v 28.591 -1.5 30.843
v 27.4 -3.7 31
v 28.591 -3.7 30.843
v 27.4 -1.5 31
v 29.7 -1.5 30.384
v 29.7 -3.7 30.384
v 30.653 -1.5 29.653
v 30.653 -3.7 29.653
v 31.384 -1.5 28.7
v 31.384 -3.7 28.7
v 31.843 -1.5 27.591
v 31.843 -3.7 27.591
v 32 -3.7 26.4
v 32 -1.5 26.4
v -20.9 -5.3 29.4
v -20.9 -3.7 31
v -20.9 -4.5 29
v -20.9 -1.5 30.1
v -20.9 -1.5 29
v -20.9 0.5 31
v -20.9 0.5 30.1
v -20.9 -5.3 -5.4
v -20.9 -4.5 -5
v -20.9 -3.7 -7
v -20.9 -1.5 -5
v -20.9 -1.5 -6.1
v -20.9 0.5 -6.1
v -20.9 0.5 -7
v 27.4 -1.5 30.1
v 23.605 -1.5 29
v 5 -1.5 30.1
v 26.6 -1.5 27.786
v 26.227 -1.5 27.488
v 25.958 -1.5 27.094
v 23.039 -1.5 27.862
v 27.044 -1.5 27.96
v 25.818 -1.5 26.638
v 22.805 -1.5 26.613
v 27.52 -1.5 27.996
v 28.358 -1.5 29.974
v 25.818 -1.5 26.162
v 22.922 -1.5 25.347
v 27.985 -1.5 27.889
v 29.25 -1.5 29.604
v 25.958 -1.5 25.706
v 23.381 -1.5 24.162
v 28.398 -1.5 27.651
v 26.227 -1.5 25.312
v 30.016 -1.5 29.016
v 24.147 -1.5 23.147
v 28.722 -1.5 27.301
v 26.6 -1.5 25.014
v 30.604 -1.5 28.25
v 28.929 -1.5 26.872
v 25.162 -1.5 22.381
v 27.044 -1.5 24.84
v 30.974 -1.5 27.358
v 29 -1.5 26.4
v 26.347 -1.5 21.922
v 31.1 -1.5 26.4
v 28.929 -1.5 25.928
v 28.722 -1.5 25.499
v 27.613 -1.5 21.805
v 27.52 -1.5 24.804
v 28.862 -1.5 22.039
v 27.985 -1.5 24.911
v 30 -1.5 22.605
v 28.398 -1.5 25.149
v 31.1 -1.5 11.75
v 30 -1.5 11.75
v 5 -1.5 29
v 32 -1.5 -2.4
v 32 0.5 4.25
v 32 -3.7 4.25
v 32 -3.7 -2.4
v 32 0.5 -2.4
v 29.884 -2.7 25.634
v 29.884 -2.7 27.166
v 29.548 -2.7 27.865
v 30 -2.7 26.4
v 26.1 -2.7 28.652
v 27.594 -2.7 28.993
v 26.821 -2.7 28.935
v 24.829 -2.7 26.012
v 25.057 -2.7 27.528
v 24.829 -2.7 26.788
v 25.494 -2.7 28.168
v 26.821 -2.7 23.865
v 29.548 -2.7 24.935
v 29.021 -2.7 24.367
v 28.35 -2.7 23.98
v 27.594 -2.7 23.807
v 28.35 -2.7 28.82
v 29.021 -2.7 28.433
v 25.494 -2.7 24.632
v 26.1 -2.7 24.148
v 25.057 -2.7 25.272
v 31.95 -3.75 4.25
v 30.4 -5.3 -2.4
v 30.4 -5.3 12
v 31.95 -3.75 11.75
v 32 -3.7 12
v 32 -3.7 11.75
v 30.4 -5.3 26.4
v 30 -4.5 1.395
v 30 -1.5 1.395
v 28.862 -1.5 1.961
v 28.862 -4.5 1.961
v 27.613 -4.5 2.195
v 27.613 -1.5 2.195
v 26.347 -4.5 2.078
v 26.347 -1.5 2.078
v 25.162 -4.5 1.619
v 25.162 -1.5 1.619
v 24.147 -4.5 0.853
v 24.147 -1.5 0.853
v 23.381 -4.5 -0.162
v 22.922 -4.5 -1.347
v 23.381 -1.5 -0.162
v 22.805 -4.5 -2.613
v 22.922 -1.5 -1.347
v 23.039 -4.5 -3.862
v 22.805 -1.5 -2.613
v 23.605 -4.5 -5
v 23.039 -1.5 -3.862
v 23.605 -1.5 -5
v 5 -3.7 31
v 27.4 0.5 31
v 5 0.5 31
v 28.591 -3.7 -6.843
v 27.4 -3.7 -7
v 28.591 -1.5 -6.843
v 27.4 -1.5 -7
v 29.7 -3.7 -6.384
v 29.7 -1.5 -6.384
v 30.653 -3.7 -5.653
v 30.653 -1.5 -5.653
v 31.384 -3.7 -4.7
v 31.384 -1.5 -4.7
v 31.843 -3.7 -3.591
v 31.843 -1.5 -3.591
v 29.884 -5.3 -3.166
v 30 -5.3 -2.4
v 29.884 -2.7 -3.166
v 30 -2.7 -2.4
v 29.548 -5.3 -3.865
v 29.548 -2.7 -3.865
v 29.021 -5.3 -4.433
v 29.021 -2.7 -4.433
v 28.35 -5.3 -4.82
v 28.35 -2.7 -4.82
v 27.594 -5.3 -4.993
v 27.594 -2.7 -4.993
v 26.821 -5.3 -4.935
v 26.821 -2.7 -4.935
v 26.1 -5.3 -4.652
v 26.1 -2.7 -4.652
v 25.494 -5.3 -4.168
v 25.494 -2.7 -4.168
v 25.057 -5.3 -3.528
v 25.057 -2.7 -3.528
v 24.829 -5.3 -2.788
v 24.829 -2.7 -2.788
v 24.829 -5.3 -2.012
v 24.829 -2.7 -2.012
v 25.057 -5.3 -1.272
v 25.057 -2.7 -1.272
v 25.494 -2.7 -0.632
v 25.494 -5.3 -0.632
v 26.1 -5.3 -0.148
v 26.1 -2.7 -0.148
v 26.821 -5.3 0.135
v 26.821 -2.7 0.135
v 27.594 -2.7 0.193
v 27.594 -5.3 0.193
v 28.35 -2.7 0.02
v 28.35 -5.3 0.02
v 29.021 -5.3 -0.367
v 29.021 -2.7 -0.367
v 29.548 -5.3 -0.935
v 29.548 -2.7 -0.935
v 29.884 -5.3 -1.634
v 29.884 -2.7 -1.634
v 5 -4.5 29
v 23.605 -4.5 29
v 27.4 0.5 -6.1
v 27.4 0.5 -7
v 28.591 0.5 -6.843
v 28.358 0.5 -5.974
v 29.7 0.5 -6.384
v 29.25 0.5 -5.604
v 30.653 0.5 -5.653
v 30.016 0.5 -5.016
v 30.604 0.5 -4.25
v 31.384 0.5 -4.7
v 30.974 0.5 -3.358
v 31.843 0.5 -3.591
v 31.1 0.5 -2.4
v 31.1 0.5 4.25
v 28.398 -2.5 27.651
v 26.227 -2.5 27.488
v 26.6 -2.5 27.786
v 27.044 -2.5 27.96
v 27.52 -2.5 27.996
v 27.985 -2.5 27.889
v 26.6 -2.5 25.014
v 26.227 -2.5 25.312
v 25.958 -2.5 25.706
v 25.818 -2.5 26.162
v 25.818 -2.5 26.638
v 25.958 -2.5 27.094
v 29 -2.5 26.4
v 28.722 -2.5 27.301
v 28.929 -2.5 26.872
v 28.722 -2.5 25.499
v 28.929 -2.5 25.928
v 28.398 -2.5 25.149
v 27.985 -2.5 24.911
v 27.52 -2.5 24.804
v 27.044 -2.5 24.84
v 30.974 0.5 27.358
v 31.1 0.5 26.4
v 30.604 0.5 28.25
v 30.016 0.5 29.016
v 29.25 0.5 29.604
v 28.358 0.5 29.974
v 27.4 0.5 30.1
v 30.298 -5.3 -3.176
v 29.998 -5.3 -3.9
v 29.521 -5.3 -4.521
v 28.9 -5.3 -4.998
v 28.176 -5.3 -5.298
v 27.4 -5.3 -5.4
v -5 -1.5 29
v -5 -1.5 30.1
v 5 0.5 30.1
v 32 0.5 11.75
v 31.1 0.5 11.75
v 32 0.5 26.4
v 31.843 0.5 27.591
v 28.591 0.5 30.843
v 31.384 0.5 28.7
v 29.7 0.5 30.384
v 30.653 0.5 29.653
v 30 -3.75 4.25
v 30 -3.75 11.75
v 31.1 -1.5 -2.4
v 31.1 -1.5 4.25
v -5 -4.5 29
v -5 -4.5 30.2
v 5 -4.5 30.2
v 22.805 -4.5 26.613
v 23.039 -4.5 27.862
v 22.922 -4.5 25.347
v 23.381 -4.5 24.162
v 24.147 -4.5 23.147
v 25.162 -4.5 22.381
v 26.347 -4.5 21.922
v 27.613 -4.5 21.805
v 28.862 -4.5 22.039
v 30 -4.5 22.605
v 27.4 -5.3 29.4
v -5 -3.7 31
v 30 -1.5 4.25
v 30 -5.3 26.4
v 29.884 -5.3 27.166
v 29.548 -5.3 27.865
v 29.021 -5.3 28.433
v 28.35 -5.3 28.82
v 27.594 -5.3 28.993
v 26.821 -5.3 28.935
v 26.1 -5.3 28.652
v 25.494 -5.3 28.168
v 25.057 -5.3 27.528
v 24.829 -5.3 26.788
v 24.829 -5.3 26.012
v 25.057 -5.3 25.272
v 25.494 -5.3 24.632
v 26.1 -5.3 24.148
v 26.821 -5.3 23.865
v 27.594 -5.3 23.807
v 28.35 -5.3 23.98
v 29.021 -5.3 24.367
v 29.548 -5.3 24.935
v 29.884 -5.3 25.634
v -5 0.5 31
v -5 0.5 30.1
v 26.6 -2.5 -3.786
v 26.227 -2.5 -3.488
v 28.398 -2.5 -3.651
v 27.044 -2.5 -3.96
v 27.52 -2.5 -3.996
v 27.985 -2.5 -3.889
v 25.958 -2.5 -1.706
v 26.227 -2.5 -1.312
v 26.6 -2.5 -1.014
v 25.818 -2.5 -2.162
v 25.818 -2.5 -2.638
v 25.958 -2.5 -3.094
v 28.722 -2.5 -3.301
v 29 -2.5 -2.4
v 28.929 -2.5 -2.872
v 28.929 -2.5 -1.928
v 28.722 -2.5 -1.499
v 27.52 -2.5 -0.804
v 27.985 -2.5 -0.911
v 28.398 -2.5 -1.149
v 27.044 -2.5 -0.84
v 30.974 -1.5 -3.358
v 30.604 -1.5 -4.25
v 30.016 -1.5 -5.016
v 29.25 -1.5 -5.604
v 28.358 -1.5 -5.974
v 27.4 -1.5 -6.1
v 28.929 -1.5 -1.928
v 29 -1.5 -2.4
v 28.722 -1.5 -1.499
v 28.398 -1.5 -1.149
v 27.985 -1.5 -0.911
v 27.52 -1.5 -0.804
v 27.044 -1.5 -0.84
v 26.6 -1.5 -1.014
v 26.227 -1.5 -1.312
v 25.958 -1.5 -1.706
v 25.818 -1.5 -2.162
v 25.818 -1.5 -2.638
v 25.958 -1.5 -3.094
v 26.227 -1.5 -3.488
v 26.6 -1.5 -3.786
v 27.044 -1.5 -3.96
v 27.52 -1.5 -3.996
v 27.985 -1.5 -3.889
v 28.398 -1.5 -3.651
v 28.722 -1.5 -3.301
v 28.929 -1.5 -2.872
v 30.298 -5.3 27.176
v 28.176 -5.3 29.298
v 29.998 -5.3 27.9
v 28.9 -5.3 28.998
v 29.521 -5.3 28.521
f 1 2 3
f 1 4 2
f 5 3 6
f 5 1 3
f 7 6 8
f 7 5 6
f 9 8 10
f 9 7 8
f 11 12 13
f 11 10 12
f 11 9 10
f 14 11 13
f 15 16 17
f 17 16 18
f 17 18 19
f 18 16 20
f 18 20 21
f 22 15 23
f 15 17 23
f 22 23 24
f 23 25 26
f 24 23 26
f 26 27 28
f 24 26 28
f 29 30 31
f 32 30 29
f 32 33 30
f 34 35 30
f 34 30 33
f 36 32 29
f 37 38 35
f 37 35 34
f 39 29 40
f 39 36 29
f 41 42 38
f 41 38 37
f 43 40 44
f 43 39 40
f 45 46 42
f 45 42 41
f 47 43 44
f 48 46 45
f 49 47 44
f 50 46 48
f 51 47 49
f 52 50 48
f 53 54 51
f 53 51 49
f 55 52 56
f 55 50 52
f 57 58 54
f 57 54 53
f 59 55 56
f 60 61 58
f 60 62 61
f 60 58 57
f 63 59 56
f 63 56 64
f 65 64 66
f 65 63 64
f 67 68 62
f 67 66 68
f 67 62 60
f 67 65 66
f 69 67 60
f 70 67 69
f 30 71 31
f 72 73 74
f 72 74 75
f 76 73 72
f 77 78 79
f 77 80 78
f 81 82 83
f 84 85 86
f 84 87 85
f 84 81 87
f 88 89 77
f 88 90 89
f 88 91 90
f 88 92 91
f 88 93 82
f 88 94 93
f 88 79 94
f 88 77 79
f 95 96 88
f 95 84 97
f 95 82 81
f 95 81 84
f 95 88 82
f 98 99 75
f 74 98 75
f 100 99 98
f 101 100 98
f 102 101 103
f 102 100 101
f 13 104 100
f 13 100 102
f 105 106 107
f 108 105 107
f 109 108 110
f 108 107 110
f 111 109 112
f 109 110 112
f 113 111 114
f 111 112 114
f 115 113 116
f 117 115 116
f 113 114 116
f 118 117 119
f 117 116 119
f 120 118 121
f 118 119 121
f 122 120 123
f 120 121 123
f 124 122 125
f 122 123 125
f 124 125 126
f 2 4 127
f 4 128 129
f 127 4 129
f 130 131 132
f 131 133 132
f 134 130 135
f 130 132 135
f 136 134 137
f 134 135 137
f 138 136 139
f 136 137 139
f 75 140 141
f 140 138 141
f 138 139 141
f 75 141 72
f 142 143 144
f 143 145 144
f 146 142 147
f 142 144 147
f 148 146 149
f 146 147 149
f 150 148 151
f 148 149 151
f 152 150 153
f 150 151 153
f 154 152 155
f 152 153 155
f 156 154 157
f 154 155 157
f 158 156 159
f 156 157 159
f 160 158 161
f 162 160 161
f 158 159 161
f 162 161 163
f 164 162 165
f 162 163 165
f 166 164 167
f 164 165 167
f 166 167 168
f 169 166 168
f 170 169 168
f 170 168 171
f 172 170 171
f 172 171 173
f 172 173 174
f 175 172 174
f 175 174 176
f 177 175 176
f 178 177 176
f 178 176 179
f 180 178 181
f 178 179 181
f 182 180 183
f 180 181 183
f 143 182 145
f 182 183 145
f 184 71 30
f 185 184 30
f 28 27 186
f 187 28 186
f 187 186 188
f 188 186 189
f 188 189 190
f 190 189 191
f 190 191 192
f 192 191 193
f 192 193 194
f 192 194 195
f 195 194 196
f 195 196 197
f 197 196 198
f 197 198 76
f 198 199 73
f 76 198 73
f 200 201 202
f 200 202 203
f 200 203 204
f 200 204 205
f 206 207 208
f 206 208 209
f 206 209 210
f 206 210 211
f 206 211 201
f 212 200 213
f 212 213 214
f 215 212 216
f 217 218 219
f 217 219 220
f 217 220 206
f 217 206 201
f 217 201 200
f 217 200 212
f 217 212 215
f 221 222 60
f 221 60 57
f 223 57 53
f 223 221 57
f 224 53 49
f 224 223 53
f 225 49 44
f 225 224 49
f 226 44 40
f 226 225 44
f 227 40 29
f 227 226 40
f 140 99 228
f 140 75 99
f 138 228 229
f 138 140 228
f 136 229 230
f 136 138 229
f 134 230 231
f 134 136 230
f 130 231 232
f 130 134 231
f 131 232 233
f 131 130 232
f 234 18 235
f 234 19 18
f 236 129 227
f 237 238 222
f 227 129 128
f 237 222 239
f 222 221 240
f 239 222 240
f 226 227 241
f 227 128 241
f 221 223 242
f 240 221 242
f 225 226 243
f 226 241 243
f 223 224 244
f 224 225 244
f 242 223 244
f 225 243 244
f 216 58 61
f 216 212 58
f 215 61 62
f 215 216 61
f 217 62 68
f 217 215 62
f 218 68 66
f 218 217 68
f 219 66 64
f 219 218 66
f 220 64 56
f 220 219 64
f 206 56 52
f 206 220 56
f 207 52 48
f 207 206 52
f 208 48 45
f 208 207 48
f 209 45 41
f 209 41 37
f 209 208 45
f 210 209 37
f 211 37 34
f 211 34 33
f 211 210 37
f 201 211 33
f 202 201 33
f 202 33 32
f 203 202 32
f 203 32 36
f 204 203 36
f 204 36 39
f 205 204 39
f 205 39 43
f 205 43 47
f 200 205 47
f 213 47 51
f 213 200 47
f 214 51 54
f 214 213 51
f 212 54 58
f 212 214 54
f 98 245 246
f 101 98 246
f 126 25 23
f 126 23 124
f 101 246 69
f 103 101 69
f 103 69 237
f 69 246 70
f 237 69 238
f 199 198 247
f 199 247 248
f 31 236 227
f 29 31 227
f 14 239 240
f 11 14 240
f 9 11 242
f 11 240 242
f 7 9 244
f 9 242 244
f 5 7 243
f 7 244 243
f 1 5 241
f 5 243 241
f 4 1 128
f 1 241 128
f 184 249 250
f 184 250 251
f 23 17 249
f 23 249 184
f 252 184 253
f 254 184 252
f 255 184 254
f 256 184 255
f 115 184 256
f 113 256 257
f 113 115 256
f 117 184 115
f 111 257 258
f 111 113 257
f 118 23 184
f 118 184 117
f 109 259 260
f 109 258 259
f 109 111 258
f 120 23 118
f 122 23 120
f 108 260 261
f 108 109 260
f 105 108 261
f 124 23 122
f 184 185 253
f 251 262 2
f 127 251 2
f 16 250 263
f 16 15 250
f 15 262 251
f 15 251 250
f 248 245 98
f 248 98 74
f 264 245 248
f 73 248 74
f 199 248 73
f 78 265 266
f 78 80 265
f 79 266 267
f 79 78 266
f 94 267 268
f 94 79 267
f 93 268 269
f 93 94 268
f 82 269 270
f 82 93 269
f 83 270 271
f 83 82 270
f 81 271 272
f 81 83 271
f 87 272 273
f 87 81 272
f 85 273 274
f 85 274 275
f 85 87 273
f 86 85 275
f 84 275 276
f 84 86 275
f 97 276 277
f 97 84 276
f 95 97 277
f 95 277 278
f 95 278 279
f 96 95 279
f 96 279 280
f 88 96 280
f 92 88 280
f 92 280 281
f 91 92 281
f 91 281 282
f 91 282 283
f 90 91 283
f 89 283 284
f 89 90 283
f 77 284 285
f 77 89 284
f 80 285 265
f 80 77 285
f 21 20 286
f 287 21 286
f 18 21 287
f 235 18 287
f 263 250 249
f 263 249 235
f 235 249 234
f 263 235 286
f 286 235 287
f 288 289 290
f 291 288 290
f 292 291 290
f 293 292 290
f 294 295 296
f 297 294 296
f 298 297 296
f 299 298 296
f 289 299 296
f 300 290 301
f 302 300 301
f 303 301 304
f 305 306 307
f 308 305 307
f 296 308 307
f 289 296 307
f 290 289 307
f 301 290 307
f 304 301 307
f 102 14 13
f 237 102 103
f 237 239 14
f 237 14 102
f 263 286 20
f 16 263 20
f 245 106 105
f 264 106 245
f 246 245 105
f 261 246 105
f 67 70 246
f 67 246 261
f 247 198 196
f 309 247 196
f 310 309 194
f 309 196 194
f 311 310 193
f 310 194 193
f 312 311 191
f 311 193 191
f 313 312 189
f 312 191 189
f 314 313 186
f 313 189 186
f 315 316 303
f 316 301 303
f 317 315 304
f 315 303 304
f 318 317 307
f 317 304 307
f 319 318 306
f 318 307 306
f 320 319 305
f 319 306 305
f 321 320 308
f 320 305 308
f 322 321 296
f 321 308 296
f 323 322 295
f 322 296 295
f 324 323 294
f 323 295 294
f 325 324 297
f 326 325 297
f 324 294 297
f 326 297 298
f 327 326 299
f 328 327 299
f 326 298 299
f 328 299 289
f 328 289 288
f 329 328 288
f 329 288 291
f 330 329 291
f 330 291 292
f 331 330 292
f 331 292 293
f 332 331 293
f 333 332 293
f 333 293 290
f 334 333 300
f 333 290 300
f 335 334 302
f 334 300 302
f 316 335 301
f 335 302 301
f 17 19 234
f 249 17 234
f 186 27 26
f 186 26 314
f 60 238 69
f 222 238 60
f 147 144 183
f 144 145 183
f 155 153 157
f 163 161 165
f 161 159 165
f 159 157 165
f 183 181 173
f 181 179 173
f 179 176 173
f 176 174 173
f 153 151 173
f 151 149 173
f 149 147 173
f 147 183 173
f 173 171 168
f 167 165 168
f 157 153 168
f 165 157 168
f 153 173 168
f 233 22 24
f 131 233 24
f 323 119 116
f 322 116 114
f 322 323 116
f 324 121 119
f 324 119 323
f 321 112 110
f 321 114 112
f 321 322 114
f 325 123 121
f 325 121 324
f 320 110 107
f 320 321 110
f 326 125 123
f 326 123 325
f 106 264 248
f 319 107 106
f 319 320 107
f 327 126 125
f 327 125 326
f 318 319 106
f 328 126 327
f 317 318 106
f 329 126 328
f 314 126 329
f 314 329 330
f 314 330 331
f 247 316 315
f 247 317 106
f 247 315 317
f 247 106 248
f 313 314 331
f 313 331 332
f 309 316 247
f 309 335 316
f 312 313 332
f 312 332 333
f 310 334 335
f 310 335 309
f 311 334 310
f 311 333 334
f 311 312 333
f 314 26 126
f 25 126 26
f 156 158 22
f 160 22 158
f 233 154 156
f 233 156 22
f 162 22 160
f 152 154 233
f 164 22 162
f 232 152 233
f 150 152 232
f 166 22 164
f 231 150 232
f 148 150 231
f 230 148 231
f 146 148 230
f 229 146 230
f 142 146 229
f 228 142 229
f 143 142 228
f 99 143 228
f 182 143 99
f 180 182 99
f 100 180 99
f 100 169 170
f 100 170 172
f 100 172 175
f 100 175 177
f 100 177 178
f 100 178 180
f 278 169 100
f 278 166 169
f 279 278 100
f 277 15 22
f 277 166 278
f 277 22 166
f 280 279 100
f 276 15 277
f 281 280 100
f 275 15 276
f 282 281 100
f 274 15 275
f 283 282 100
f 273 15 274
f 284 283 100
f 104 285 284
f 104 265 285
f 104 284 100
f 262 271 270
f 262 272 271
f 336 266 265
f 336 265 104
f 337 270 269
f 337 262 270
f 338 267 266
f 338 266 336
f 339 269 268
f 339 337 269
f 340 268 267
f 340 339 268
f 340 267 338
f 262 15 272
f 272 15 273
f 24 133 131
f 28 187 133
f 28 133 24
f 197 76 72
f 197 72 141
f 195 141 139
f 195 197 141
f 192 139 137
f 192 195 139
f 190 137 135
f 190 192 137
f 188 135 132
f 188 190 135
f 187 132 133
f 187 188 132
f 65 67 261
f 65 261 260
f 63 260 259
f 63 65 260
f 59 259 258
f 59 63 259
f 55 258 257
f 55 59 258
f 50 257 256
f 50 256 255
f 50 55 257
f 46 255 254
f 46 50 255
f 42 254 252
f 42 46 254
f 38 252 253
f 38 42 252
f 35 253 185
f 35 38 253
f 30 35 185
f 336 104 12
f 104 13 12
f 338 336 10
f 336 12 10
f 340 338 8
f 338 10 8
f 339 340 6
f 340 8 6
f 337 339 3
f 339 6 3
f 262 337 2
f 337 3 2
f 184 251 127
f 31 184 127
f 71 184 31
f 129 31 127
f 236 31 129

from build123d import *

# Parameters (mm, degrees)
SKETCH037_W       = 7.5
SKETCH037_H       = 7.5
EXTRUDE045_DEPTH  = 10
SKETCH036_W       = 10
SKETCH036_H       = 9
EXTRUDE044_DEPTH  = 10
CYLINDER001_R     = 2
CYLINDER001_DEPTH = 10
SKETCH032_R       = 2.6
EXTRUDE043_DEPTH  = 0.8
EXTRUDE055_DEPTH  = 3
EXTRUDE056_DEPTH  = 0.8
EXTRUDE038_DEPTH  = 2


with BuildPart() as extrude045:
    # Sketch037 → Extrude045 (new body)
    with BuildSketch(Plane.YZ.offset(35)):
        with Locations((0, 8)):
            Rectangle(SKETCH037_W, SKETCH037_H)
    extrude(amount=EXTRUDE045_DEPTH)


with BuildPart() as extrude045_1:
    # Extrude045 placement: moved
    add(extrude045.part.moved(Location((-9.5, 0, 0))))


with BuildPart() as extrude044:
    # Sketch036 → Extrude044 (new body)
    with BuildSketch(Plane.XY.offset(40)):
        Rectangle(SKETCH036_W, SKETCH036_H)
    extrude(amount=EXTRUDE044_DEPTH)


with BuildPart() as extrude044_1:
    # Extrude044 placement: moved
    add(extrude044.part.moved(Location((0, 0, -15.5))))


with BuildPart() as common_sub:
    # Cylinder001 → Cylinder001 (new body)
    with BuildSketch(Plane(origin=(-92.5, 0, 12), x_dir=(0, 0, 1), z_dir=(-1, 0, 0))):
        Circle(CYLINDER001_R)
    extrude(amount=CYLINDER001_DEPTH)

    # Fusion033: union Extrude045, Extrude044
    add(extrude045_1.part)
    add(extrude044_1.part)


with BuildPart() as sweep_body:
    # Sweep: sweep along a path in Sketch034
    with BuildLine(Plane.XZ.offset(10)) as sweep_path:
        Line((32, 11.999174), (32, 26.4))
        ThreePointArc((32, 26.4), (30.652691, 29.652691), (27.4, 31))
        Line((27.4, 31), (-60.9, 31))
    # Sketch033 → Sweep (sweep)
    with BuildSketch(Plane.YZ):
        Polygon((-5.3, 29.4), (-3.7, 31), (-3.7, 32), (-6, 32), (-6, 29.4), align=None)
    sweep(path=sweep_path.line)


with BuildPart() as fusion:
    # Sketch032 → Extrude043 (new body)
    with BuildSketch(Plane.XZ.offset(10)):
        with Locations((27.4, 26.4)):
            Circle(SKETCH032_R)
    extrude(amount=EXTRUDE043_DEPTH)


with BuildPart() as fusion_1:
    # Extrude043 placement: moved
    add(fusion.part.moved(Location((0, 5.5, 0))))

    # Fusion: union Sweep body
    add(sweep_body.part)


with BuildPart() as screw_hole_bottom002:
    # Sketch003 → Revolve (revolve)
    with BuildSketch(Plane.XY):
        Polygon((1.6, 3), (1.6, 2), (0, 2), (0, 1.8), (2.6, 1.8), (2.6, 0), (4.6, 0), (4.6, 3), align=None)
    revolve(axis=Axis((0, 0, 0), (0, 1, 0)))


with BuildPart() as screw_hole_bottom002_1:
    # Body003 placement: moved
    add(screw_hole_bottom002.part.moved(Location((27.4, -4.5, 26.4))))


with BuildPart() as bottom010:
    # Sketch053 → Extrude055 (new body)
    with BuildSketch(Plane.XZ.offset(10)):
        with BuildLine():
            ThreePointArc((32, 26.4), (30.652691, 29.652691), (27.4, 31))
            Line((27.4, 31), (-20.9, 31))
            Line((-20.9, 31), (-20.9, 29))
            Line((-20.9, 29), (27.4, 29))
            ThreePointArc((30, 26.4), (29.238478, 28.238478), (27.4, 29))
            Line((30, 12), (30, 26.4))
            Line((32, 12), (30, 12))
            Line((32, 26.4), (32, 12))
        make_face()
    extrude(amount=EXTRUDE055_DEPTH)


with BuildPart() as bottom010_1:
    # Extrude055 placement: moved
    add(bottom010.part.moved(Location((0, 8.5, 0))))


with BuildPart() as bottom011:
    # Sketch052 → Extrude056 (new body)
    with BuildSketch(Plane.XZ.offset(10)):
        with BuildLine():
            ThreePointArc((32, 26.399909), (30.652691, 29.6526), (27.4, 30.999909))
            Line((27.4, 30.999909), (-20.9, 30.999909))
            Line((-20.9, 30.999909), (-20.9, 11.999909))
            Line((-20.9, 11.999909), (32, 11.999909))
            Line((32, 26.399909), (32, 11.999909))
        make_face()
    extrude(amount=EXTRUDE056_DEPTH)


with BuildPart() as bottom011_1:
    # Extrude056 placement: moved
    add(bottom011.part.moved(Location((0, 5.5, 0))))


with BuildPart() as bottom:
    # Sketch030 → Extrude038 (new body)
    with BuildSketch(Plane.XZ.offset(10)):
        with BuildLine():
            ThreePointArc((32, 26.4), (30.652691, 29.652691), (27.4, 31))
            Line((27.4, 31), (-20.9, 31))
            Line((-20.9, 31), (-20.9, 30.1))
            Line((-20.9, 30.1), (27.4, 30.1))
            ThreePointArc((31.1, 26.4), (30.016295, 29.016295), (27.4, 30.1))
            Line((31.1, 12), (31.1, 26.4))
            Line((32, 12), (31.1, 12))
            Line((32, 26.4), (32, 12))
        make_face()
    extrude(amount=EXTRUDE038_DEPTH)


with BuildPart() as bottom_1:
    # Extrude038 placement: moved
    add(bottom.part.moved(Location((0, 10.5, 0))))

    # Fusion029: union screw hole bottom002, bottom010, bottom011
    add(screw_hole_bottom002_1.part)
    add(bottom010_1.part)
    add(bottom011_1.part)

    # Cut: cut Fusion
    add(fusion_1.part, mode=Mode.SUBTRACT)


with BuildPart() as bottom007:
    # Part__Mirroring004: instance of bottom
    add(bottom_1.part.mirror(Plane(origin=(0, 0, 12), x_dir=(0, 1, 0), z_dir=(0, 0, 1))))

    # Fusion031: union bottom
    add(bottom_1.part)

    # Cut026: cut common sub
    add(common_sub.part, mode=Mode.SUBTRACT)


solid = bottom007.part
